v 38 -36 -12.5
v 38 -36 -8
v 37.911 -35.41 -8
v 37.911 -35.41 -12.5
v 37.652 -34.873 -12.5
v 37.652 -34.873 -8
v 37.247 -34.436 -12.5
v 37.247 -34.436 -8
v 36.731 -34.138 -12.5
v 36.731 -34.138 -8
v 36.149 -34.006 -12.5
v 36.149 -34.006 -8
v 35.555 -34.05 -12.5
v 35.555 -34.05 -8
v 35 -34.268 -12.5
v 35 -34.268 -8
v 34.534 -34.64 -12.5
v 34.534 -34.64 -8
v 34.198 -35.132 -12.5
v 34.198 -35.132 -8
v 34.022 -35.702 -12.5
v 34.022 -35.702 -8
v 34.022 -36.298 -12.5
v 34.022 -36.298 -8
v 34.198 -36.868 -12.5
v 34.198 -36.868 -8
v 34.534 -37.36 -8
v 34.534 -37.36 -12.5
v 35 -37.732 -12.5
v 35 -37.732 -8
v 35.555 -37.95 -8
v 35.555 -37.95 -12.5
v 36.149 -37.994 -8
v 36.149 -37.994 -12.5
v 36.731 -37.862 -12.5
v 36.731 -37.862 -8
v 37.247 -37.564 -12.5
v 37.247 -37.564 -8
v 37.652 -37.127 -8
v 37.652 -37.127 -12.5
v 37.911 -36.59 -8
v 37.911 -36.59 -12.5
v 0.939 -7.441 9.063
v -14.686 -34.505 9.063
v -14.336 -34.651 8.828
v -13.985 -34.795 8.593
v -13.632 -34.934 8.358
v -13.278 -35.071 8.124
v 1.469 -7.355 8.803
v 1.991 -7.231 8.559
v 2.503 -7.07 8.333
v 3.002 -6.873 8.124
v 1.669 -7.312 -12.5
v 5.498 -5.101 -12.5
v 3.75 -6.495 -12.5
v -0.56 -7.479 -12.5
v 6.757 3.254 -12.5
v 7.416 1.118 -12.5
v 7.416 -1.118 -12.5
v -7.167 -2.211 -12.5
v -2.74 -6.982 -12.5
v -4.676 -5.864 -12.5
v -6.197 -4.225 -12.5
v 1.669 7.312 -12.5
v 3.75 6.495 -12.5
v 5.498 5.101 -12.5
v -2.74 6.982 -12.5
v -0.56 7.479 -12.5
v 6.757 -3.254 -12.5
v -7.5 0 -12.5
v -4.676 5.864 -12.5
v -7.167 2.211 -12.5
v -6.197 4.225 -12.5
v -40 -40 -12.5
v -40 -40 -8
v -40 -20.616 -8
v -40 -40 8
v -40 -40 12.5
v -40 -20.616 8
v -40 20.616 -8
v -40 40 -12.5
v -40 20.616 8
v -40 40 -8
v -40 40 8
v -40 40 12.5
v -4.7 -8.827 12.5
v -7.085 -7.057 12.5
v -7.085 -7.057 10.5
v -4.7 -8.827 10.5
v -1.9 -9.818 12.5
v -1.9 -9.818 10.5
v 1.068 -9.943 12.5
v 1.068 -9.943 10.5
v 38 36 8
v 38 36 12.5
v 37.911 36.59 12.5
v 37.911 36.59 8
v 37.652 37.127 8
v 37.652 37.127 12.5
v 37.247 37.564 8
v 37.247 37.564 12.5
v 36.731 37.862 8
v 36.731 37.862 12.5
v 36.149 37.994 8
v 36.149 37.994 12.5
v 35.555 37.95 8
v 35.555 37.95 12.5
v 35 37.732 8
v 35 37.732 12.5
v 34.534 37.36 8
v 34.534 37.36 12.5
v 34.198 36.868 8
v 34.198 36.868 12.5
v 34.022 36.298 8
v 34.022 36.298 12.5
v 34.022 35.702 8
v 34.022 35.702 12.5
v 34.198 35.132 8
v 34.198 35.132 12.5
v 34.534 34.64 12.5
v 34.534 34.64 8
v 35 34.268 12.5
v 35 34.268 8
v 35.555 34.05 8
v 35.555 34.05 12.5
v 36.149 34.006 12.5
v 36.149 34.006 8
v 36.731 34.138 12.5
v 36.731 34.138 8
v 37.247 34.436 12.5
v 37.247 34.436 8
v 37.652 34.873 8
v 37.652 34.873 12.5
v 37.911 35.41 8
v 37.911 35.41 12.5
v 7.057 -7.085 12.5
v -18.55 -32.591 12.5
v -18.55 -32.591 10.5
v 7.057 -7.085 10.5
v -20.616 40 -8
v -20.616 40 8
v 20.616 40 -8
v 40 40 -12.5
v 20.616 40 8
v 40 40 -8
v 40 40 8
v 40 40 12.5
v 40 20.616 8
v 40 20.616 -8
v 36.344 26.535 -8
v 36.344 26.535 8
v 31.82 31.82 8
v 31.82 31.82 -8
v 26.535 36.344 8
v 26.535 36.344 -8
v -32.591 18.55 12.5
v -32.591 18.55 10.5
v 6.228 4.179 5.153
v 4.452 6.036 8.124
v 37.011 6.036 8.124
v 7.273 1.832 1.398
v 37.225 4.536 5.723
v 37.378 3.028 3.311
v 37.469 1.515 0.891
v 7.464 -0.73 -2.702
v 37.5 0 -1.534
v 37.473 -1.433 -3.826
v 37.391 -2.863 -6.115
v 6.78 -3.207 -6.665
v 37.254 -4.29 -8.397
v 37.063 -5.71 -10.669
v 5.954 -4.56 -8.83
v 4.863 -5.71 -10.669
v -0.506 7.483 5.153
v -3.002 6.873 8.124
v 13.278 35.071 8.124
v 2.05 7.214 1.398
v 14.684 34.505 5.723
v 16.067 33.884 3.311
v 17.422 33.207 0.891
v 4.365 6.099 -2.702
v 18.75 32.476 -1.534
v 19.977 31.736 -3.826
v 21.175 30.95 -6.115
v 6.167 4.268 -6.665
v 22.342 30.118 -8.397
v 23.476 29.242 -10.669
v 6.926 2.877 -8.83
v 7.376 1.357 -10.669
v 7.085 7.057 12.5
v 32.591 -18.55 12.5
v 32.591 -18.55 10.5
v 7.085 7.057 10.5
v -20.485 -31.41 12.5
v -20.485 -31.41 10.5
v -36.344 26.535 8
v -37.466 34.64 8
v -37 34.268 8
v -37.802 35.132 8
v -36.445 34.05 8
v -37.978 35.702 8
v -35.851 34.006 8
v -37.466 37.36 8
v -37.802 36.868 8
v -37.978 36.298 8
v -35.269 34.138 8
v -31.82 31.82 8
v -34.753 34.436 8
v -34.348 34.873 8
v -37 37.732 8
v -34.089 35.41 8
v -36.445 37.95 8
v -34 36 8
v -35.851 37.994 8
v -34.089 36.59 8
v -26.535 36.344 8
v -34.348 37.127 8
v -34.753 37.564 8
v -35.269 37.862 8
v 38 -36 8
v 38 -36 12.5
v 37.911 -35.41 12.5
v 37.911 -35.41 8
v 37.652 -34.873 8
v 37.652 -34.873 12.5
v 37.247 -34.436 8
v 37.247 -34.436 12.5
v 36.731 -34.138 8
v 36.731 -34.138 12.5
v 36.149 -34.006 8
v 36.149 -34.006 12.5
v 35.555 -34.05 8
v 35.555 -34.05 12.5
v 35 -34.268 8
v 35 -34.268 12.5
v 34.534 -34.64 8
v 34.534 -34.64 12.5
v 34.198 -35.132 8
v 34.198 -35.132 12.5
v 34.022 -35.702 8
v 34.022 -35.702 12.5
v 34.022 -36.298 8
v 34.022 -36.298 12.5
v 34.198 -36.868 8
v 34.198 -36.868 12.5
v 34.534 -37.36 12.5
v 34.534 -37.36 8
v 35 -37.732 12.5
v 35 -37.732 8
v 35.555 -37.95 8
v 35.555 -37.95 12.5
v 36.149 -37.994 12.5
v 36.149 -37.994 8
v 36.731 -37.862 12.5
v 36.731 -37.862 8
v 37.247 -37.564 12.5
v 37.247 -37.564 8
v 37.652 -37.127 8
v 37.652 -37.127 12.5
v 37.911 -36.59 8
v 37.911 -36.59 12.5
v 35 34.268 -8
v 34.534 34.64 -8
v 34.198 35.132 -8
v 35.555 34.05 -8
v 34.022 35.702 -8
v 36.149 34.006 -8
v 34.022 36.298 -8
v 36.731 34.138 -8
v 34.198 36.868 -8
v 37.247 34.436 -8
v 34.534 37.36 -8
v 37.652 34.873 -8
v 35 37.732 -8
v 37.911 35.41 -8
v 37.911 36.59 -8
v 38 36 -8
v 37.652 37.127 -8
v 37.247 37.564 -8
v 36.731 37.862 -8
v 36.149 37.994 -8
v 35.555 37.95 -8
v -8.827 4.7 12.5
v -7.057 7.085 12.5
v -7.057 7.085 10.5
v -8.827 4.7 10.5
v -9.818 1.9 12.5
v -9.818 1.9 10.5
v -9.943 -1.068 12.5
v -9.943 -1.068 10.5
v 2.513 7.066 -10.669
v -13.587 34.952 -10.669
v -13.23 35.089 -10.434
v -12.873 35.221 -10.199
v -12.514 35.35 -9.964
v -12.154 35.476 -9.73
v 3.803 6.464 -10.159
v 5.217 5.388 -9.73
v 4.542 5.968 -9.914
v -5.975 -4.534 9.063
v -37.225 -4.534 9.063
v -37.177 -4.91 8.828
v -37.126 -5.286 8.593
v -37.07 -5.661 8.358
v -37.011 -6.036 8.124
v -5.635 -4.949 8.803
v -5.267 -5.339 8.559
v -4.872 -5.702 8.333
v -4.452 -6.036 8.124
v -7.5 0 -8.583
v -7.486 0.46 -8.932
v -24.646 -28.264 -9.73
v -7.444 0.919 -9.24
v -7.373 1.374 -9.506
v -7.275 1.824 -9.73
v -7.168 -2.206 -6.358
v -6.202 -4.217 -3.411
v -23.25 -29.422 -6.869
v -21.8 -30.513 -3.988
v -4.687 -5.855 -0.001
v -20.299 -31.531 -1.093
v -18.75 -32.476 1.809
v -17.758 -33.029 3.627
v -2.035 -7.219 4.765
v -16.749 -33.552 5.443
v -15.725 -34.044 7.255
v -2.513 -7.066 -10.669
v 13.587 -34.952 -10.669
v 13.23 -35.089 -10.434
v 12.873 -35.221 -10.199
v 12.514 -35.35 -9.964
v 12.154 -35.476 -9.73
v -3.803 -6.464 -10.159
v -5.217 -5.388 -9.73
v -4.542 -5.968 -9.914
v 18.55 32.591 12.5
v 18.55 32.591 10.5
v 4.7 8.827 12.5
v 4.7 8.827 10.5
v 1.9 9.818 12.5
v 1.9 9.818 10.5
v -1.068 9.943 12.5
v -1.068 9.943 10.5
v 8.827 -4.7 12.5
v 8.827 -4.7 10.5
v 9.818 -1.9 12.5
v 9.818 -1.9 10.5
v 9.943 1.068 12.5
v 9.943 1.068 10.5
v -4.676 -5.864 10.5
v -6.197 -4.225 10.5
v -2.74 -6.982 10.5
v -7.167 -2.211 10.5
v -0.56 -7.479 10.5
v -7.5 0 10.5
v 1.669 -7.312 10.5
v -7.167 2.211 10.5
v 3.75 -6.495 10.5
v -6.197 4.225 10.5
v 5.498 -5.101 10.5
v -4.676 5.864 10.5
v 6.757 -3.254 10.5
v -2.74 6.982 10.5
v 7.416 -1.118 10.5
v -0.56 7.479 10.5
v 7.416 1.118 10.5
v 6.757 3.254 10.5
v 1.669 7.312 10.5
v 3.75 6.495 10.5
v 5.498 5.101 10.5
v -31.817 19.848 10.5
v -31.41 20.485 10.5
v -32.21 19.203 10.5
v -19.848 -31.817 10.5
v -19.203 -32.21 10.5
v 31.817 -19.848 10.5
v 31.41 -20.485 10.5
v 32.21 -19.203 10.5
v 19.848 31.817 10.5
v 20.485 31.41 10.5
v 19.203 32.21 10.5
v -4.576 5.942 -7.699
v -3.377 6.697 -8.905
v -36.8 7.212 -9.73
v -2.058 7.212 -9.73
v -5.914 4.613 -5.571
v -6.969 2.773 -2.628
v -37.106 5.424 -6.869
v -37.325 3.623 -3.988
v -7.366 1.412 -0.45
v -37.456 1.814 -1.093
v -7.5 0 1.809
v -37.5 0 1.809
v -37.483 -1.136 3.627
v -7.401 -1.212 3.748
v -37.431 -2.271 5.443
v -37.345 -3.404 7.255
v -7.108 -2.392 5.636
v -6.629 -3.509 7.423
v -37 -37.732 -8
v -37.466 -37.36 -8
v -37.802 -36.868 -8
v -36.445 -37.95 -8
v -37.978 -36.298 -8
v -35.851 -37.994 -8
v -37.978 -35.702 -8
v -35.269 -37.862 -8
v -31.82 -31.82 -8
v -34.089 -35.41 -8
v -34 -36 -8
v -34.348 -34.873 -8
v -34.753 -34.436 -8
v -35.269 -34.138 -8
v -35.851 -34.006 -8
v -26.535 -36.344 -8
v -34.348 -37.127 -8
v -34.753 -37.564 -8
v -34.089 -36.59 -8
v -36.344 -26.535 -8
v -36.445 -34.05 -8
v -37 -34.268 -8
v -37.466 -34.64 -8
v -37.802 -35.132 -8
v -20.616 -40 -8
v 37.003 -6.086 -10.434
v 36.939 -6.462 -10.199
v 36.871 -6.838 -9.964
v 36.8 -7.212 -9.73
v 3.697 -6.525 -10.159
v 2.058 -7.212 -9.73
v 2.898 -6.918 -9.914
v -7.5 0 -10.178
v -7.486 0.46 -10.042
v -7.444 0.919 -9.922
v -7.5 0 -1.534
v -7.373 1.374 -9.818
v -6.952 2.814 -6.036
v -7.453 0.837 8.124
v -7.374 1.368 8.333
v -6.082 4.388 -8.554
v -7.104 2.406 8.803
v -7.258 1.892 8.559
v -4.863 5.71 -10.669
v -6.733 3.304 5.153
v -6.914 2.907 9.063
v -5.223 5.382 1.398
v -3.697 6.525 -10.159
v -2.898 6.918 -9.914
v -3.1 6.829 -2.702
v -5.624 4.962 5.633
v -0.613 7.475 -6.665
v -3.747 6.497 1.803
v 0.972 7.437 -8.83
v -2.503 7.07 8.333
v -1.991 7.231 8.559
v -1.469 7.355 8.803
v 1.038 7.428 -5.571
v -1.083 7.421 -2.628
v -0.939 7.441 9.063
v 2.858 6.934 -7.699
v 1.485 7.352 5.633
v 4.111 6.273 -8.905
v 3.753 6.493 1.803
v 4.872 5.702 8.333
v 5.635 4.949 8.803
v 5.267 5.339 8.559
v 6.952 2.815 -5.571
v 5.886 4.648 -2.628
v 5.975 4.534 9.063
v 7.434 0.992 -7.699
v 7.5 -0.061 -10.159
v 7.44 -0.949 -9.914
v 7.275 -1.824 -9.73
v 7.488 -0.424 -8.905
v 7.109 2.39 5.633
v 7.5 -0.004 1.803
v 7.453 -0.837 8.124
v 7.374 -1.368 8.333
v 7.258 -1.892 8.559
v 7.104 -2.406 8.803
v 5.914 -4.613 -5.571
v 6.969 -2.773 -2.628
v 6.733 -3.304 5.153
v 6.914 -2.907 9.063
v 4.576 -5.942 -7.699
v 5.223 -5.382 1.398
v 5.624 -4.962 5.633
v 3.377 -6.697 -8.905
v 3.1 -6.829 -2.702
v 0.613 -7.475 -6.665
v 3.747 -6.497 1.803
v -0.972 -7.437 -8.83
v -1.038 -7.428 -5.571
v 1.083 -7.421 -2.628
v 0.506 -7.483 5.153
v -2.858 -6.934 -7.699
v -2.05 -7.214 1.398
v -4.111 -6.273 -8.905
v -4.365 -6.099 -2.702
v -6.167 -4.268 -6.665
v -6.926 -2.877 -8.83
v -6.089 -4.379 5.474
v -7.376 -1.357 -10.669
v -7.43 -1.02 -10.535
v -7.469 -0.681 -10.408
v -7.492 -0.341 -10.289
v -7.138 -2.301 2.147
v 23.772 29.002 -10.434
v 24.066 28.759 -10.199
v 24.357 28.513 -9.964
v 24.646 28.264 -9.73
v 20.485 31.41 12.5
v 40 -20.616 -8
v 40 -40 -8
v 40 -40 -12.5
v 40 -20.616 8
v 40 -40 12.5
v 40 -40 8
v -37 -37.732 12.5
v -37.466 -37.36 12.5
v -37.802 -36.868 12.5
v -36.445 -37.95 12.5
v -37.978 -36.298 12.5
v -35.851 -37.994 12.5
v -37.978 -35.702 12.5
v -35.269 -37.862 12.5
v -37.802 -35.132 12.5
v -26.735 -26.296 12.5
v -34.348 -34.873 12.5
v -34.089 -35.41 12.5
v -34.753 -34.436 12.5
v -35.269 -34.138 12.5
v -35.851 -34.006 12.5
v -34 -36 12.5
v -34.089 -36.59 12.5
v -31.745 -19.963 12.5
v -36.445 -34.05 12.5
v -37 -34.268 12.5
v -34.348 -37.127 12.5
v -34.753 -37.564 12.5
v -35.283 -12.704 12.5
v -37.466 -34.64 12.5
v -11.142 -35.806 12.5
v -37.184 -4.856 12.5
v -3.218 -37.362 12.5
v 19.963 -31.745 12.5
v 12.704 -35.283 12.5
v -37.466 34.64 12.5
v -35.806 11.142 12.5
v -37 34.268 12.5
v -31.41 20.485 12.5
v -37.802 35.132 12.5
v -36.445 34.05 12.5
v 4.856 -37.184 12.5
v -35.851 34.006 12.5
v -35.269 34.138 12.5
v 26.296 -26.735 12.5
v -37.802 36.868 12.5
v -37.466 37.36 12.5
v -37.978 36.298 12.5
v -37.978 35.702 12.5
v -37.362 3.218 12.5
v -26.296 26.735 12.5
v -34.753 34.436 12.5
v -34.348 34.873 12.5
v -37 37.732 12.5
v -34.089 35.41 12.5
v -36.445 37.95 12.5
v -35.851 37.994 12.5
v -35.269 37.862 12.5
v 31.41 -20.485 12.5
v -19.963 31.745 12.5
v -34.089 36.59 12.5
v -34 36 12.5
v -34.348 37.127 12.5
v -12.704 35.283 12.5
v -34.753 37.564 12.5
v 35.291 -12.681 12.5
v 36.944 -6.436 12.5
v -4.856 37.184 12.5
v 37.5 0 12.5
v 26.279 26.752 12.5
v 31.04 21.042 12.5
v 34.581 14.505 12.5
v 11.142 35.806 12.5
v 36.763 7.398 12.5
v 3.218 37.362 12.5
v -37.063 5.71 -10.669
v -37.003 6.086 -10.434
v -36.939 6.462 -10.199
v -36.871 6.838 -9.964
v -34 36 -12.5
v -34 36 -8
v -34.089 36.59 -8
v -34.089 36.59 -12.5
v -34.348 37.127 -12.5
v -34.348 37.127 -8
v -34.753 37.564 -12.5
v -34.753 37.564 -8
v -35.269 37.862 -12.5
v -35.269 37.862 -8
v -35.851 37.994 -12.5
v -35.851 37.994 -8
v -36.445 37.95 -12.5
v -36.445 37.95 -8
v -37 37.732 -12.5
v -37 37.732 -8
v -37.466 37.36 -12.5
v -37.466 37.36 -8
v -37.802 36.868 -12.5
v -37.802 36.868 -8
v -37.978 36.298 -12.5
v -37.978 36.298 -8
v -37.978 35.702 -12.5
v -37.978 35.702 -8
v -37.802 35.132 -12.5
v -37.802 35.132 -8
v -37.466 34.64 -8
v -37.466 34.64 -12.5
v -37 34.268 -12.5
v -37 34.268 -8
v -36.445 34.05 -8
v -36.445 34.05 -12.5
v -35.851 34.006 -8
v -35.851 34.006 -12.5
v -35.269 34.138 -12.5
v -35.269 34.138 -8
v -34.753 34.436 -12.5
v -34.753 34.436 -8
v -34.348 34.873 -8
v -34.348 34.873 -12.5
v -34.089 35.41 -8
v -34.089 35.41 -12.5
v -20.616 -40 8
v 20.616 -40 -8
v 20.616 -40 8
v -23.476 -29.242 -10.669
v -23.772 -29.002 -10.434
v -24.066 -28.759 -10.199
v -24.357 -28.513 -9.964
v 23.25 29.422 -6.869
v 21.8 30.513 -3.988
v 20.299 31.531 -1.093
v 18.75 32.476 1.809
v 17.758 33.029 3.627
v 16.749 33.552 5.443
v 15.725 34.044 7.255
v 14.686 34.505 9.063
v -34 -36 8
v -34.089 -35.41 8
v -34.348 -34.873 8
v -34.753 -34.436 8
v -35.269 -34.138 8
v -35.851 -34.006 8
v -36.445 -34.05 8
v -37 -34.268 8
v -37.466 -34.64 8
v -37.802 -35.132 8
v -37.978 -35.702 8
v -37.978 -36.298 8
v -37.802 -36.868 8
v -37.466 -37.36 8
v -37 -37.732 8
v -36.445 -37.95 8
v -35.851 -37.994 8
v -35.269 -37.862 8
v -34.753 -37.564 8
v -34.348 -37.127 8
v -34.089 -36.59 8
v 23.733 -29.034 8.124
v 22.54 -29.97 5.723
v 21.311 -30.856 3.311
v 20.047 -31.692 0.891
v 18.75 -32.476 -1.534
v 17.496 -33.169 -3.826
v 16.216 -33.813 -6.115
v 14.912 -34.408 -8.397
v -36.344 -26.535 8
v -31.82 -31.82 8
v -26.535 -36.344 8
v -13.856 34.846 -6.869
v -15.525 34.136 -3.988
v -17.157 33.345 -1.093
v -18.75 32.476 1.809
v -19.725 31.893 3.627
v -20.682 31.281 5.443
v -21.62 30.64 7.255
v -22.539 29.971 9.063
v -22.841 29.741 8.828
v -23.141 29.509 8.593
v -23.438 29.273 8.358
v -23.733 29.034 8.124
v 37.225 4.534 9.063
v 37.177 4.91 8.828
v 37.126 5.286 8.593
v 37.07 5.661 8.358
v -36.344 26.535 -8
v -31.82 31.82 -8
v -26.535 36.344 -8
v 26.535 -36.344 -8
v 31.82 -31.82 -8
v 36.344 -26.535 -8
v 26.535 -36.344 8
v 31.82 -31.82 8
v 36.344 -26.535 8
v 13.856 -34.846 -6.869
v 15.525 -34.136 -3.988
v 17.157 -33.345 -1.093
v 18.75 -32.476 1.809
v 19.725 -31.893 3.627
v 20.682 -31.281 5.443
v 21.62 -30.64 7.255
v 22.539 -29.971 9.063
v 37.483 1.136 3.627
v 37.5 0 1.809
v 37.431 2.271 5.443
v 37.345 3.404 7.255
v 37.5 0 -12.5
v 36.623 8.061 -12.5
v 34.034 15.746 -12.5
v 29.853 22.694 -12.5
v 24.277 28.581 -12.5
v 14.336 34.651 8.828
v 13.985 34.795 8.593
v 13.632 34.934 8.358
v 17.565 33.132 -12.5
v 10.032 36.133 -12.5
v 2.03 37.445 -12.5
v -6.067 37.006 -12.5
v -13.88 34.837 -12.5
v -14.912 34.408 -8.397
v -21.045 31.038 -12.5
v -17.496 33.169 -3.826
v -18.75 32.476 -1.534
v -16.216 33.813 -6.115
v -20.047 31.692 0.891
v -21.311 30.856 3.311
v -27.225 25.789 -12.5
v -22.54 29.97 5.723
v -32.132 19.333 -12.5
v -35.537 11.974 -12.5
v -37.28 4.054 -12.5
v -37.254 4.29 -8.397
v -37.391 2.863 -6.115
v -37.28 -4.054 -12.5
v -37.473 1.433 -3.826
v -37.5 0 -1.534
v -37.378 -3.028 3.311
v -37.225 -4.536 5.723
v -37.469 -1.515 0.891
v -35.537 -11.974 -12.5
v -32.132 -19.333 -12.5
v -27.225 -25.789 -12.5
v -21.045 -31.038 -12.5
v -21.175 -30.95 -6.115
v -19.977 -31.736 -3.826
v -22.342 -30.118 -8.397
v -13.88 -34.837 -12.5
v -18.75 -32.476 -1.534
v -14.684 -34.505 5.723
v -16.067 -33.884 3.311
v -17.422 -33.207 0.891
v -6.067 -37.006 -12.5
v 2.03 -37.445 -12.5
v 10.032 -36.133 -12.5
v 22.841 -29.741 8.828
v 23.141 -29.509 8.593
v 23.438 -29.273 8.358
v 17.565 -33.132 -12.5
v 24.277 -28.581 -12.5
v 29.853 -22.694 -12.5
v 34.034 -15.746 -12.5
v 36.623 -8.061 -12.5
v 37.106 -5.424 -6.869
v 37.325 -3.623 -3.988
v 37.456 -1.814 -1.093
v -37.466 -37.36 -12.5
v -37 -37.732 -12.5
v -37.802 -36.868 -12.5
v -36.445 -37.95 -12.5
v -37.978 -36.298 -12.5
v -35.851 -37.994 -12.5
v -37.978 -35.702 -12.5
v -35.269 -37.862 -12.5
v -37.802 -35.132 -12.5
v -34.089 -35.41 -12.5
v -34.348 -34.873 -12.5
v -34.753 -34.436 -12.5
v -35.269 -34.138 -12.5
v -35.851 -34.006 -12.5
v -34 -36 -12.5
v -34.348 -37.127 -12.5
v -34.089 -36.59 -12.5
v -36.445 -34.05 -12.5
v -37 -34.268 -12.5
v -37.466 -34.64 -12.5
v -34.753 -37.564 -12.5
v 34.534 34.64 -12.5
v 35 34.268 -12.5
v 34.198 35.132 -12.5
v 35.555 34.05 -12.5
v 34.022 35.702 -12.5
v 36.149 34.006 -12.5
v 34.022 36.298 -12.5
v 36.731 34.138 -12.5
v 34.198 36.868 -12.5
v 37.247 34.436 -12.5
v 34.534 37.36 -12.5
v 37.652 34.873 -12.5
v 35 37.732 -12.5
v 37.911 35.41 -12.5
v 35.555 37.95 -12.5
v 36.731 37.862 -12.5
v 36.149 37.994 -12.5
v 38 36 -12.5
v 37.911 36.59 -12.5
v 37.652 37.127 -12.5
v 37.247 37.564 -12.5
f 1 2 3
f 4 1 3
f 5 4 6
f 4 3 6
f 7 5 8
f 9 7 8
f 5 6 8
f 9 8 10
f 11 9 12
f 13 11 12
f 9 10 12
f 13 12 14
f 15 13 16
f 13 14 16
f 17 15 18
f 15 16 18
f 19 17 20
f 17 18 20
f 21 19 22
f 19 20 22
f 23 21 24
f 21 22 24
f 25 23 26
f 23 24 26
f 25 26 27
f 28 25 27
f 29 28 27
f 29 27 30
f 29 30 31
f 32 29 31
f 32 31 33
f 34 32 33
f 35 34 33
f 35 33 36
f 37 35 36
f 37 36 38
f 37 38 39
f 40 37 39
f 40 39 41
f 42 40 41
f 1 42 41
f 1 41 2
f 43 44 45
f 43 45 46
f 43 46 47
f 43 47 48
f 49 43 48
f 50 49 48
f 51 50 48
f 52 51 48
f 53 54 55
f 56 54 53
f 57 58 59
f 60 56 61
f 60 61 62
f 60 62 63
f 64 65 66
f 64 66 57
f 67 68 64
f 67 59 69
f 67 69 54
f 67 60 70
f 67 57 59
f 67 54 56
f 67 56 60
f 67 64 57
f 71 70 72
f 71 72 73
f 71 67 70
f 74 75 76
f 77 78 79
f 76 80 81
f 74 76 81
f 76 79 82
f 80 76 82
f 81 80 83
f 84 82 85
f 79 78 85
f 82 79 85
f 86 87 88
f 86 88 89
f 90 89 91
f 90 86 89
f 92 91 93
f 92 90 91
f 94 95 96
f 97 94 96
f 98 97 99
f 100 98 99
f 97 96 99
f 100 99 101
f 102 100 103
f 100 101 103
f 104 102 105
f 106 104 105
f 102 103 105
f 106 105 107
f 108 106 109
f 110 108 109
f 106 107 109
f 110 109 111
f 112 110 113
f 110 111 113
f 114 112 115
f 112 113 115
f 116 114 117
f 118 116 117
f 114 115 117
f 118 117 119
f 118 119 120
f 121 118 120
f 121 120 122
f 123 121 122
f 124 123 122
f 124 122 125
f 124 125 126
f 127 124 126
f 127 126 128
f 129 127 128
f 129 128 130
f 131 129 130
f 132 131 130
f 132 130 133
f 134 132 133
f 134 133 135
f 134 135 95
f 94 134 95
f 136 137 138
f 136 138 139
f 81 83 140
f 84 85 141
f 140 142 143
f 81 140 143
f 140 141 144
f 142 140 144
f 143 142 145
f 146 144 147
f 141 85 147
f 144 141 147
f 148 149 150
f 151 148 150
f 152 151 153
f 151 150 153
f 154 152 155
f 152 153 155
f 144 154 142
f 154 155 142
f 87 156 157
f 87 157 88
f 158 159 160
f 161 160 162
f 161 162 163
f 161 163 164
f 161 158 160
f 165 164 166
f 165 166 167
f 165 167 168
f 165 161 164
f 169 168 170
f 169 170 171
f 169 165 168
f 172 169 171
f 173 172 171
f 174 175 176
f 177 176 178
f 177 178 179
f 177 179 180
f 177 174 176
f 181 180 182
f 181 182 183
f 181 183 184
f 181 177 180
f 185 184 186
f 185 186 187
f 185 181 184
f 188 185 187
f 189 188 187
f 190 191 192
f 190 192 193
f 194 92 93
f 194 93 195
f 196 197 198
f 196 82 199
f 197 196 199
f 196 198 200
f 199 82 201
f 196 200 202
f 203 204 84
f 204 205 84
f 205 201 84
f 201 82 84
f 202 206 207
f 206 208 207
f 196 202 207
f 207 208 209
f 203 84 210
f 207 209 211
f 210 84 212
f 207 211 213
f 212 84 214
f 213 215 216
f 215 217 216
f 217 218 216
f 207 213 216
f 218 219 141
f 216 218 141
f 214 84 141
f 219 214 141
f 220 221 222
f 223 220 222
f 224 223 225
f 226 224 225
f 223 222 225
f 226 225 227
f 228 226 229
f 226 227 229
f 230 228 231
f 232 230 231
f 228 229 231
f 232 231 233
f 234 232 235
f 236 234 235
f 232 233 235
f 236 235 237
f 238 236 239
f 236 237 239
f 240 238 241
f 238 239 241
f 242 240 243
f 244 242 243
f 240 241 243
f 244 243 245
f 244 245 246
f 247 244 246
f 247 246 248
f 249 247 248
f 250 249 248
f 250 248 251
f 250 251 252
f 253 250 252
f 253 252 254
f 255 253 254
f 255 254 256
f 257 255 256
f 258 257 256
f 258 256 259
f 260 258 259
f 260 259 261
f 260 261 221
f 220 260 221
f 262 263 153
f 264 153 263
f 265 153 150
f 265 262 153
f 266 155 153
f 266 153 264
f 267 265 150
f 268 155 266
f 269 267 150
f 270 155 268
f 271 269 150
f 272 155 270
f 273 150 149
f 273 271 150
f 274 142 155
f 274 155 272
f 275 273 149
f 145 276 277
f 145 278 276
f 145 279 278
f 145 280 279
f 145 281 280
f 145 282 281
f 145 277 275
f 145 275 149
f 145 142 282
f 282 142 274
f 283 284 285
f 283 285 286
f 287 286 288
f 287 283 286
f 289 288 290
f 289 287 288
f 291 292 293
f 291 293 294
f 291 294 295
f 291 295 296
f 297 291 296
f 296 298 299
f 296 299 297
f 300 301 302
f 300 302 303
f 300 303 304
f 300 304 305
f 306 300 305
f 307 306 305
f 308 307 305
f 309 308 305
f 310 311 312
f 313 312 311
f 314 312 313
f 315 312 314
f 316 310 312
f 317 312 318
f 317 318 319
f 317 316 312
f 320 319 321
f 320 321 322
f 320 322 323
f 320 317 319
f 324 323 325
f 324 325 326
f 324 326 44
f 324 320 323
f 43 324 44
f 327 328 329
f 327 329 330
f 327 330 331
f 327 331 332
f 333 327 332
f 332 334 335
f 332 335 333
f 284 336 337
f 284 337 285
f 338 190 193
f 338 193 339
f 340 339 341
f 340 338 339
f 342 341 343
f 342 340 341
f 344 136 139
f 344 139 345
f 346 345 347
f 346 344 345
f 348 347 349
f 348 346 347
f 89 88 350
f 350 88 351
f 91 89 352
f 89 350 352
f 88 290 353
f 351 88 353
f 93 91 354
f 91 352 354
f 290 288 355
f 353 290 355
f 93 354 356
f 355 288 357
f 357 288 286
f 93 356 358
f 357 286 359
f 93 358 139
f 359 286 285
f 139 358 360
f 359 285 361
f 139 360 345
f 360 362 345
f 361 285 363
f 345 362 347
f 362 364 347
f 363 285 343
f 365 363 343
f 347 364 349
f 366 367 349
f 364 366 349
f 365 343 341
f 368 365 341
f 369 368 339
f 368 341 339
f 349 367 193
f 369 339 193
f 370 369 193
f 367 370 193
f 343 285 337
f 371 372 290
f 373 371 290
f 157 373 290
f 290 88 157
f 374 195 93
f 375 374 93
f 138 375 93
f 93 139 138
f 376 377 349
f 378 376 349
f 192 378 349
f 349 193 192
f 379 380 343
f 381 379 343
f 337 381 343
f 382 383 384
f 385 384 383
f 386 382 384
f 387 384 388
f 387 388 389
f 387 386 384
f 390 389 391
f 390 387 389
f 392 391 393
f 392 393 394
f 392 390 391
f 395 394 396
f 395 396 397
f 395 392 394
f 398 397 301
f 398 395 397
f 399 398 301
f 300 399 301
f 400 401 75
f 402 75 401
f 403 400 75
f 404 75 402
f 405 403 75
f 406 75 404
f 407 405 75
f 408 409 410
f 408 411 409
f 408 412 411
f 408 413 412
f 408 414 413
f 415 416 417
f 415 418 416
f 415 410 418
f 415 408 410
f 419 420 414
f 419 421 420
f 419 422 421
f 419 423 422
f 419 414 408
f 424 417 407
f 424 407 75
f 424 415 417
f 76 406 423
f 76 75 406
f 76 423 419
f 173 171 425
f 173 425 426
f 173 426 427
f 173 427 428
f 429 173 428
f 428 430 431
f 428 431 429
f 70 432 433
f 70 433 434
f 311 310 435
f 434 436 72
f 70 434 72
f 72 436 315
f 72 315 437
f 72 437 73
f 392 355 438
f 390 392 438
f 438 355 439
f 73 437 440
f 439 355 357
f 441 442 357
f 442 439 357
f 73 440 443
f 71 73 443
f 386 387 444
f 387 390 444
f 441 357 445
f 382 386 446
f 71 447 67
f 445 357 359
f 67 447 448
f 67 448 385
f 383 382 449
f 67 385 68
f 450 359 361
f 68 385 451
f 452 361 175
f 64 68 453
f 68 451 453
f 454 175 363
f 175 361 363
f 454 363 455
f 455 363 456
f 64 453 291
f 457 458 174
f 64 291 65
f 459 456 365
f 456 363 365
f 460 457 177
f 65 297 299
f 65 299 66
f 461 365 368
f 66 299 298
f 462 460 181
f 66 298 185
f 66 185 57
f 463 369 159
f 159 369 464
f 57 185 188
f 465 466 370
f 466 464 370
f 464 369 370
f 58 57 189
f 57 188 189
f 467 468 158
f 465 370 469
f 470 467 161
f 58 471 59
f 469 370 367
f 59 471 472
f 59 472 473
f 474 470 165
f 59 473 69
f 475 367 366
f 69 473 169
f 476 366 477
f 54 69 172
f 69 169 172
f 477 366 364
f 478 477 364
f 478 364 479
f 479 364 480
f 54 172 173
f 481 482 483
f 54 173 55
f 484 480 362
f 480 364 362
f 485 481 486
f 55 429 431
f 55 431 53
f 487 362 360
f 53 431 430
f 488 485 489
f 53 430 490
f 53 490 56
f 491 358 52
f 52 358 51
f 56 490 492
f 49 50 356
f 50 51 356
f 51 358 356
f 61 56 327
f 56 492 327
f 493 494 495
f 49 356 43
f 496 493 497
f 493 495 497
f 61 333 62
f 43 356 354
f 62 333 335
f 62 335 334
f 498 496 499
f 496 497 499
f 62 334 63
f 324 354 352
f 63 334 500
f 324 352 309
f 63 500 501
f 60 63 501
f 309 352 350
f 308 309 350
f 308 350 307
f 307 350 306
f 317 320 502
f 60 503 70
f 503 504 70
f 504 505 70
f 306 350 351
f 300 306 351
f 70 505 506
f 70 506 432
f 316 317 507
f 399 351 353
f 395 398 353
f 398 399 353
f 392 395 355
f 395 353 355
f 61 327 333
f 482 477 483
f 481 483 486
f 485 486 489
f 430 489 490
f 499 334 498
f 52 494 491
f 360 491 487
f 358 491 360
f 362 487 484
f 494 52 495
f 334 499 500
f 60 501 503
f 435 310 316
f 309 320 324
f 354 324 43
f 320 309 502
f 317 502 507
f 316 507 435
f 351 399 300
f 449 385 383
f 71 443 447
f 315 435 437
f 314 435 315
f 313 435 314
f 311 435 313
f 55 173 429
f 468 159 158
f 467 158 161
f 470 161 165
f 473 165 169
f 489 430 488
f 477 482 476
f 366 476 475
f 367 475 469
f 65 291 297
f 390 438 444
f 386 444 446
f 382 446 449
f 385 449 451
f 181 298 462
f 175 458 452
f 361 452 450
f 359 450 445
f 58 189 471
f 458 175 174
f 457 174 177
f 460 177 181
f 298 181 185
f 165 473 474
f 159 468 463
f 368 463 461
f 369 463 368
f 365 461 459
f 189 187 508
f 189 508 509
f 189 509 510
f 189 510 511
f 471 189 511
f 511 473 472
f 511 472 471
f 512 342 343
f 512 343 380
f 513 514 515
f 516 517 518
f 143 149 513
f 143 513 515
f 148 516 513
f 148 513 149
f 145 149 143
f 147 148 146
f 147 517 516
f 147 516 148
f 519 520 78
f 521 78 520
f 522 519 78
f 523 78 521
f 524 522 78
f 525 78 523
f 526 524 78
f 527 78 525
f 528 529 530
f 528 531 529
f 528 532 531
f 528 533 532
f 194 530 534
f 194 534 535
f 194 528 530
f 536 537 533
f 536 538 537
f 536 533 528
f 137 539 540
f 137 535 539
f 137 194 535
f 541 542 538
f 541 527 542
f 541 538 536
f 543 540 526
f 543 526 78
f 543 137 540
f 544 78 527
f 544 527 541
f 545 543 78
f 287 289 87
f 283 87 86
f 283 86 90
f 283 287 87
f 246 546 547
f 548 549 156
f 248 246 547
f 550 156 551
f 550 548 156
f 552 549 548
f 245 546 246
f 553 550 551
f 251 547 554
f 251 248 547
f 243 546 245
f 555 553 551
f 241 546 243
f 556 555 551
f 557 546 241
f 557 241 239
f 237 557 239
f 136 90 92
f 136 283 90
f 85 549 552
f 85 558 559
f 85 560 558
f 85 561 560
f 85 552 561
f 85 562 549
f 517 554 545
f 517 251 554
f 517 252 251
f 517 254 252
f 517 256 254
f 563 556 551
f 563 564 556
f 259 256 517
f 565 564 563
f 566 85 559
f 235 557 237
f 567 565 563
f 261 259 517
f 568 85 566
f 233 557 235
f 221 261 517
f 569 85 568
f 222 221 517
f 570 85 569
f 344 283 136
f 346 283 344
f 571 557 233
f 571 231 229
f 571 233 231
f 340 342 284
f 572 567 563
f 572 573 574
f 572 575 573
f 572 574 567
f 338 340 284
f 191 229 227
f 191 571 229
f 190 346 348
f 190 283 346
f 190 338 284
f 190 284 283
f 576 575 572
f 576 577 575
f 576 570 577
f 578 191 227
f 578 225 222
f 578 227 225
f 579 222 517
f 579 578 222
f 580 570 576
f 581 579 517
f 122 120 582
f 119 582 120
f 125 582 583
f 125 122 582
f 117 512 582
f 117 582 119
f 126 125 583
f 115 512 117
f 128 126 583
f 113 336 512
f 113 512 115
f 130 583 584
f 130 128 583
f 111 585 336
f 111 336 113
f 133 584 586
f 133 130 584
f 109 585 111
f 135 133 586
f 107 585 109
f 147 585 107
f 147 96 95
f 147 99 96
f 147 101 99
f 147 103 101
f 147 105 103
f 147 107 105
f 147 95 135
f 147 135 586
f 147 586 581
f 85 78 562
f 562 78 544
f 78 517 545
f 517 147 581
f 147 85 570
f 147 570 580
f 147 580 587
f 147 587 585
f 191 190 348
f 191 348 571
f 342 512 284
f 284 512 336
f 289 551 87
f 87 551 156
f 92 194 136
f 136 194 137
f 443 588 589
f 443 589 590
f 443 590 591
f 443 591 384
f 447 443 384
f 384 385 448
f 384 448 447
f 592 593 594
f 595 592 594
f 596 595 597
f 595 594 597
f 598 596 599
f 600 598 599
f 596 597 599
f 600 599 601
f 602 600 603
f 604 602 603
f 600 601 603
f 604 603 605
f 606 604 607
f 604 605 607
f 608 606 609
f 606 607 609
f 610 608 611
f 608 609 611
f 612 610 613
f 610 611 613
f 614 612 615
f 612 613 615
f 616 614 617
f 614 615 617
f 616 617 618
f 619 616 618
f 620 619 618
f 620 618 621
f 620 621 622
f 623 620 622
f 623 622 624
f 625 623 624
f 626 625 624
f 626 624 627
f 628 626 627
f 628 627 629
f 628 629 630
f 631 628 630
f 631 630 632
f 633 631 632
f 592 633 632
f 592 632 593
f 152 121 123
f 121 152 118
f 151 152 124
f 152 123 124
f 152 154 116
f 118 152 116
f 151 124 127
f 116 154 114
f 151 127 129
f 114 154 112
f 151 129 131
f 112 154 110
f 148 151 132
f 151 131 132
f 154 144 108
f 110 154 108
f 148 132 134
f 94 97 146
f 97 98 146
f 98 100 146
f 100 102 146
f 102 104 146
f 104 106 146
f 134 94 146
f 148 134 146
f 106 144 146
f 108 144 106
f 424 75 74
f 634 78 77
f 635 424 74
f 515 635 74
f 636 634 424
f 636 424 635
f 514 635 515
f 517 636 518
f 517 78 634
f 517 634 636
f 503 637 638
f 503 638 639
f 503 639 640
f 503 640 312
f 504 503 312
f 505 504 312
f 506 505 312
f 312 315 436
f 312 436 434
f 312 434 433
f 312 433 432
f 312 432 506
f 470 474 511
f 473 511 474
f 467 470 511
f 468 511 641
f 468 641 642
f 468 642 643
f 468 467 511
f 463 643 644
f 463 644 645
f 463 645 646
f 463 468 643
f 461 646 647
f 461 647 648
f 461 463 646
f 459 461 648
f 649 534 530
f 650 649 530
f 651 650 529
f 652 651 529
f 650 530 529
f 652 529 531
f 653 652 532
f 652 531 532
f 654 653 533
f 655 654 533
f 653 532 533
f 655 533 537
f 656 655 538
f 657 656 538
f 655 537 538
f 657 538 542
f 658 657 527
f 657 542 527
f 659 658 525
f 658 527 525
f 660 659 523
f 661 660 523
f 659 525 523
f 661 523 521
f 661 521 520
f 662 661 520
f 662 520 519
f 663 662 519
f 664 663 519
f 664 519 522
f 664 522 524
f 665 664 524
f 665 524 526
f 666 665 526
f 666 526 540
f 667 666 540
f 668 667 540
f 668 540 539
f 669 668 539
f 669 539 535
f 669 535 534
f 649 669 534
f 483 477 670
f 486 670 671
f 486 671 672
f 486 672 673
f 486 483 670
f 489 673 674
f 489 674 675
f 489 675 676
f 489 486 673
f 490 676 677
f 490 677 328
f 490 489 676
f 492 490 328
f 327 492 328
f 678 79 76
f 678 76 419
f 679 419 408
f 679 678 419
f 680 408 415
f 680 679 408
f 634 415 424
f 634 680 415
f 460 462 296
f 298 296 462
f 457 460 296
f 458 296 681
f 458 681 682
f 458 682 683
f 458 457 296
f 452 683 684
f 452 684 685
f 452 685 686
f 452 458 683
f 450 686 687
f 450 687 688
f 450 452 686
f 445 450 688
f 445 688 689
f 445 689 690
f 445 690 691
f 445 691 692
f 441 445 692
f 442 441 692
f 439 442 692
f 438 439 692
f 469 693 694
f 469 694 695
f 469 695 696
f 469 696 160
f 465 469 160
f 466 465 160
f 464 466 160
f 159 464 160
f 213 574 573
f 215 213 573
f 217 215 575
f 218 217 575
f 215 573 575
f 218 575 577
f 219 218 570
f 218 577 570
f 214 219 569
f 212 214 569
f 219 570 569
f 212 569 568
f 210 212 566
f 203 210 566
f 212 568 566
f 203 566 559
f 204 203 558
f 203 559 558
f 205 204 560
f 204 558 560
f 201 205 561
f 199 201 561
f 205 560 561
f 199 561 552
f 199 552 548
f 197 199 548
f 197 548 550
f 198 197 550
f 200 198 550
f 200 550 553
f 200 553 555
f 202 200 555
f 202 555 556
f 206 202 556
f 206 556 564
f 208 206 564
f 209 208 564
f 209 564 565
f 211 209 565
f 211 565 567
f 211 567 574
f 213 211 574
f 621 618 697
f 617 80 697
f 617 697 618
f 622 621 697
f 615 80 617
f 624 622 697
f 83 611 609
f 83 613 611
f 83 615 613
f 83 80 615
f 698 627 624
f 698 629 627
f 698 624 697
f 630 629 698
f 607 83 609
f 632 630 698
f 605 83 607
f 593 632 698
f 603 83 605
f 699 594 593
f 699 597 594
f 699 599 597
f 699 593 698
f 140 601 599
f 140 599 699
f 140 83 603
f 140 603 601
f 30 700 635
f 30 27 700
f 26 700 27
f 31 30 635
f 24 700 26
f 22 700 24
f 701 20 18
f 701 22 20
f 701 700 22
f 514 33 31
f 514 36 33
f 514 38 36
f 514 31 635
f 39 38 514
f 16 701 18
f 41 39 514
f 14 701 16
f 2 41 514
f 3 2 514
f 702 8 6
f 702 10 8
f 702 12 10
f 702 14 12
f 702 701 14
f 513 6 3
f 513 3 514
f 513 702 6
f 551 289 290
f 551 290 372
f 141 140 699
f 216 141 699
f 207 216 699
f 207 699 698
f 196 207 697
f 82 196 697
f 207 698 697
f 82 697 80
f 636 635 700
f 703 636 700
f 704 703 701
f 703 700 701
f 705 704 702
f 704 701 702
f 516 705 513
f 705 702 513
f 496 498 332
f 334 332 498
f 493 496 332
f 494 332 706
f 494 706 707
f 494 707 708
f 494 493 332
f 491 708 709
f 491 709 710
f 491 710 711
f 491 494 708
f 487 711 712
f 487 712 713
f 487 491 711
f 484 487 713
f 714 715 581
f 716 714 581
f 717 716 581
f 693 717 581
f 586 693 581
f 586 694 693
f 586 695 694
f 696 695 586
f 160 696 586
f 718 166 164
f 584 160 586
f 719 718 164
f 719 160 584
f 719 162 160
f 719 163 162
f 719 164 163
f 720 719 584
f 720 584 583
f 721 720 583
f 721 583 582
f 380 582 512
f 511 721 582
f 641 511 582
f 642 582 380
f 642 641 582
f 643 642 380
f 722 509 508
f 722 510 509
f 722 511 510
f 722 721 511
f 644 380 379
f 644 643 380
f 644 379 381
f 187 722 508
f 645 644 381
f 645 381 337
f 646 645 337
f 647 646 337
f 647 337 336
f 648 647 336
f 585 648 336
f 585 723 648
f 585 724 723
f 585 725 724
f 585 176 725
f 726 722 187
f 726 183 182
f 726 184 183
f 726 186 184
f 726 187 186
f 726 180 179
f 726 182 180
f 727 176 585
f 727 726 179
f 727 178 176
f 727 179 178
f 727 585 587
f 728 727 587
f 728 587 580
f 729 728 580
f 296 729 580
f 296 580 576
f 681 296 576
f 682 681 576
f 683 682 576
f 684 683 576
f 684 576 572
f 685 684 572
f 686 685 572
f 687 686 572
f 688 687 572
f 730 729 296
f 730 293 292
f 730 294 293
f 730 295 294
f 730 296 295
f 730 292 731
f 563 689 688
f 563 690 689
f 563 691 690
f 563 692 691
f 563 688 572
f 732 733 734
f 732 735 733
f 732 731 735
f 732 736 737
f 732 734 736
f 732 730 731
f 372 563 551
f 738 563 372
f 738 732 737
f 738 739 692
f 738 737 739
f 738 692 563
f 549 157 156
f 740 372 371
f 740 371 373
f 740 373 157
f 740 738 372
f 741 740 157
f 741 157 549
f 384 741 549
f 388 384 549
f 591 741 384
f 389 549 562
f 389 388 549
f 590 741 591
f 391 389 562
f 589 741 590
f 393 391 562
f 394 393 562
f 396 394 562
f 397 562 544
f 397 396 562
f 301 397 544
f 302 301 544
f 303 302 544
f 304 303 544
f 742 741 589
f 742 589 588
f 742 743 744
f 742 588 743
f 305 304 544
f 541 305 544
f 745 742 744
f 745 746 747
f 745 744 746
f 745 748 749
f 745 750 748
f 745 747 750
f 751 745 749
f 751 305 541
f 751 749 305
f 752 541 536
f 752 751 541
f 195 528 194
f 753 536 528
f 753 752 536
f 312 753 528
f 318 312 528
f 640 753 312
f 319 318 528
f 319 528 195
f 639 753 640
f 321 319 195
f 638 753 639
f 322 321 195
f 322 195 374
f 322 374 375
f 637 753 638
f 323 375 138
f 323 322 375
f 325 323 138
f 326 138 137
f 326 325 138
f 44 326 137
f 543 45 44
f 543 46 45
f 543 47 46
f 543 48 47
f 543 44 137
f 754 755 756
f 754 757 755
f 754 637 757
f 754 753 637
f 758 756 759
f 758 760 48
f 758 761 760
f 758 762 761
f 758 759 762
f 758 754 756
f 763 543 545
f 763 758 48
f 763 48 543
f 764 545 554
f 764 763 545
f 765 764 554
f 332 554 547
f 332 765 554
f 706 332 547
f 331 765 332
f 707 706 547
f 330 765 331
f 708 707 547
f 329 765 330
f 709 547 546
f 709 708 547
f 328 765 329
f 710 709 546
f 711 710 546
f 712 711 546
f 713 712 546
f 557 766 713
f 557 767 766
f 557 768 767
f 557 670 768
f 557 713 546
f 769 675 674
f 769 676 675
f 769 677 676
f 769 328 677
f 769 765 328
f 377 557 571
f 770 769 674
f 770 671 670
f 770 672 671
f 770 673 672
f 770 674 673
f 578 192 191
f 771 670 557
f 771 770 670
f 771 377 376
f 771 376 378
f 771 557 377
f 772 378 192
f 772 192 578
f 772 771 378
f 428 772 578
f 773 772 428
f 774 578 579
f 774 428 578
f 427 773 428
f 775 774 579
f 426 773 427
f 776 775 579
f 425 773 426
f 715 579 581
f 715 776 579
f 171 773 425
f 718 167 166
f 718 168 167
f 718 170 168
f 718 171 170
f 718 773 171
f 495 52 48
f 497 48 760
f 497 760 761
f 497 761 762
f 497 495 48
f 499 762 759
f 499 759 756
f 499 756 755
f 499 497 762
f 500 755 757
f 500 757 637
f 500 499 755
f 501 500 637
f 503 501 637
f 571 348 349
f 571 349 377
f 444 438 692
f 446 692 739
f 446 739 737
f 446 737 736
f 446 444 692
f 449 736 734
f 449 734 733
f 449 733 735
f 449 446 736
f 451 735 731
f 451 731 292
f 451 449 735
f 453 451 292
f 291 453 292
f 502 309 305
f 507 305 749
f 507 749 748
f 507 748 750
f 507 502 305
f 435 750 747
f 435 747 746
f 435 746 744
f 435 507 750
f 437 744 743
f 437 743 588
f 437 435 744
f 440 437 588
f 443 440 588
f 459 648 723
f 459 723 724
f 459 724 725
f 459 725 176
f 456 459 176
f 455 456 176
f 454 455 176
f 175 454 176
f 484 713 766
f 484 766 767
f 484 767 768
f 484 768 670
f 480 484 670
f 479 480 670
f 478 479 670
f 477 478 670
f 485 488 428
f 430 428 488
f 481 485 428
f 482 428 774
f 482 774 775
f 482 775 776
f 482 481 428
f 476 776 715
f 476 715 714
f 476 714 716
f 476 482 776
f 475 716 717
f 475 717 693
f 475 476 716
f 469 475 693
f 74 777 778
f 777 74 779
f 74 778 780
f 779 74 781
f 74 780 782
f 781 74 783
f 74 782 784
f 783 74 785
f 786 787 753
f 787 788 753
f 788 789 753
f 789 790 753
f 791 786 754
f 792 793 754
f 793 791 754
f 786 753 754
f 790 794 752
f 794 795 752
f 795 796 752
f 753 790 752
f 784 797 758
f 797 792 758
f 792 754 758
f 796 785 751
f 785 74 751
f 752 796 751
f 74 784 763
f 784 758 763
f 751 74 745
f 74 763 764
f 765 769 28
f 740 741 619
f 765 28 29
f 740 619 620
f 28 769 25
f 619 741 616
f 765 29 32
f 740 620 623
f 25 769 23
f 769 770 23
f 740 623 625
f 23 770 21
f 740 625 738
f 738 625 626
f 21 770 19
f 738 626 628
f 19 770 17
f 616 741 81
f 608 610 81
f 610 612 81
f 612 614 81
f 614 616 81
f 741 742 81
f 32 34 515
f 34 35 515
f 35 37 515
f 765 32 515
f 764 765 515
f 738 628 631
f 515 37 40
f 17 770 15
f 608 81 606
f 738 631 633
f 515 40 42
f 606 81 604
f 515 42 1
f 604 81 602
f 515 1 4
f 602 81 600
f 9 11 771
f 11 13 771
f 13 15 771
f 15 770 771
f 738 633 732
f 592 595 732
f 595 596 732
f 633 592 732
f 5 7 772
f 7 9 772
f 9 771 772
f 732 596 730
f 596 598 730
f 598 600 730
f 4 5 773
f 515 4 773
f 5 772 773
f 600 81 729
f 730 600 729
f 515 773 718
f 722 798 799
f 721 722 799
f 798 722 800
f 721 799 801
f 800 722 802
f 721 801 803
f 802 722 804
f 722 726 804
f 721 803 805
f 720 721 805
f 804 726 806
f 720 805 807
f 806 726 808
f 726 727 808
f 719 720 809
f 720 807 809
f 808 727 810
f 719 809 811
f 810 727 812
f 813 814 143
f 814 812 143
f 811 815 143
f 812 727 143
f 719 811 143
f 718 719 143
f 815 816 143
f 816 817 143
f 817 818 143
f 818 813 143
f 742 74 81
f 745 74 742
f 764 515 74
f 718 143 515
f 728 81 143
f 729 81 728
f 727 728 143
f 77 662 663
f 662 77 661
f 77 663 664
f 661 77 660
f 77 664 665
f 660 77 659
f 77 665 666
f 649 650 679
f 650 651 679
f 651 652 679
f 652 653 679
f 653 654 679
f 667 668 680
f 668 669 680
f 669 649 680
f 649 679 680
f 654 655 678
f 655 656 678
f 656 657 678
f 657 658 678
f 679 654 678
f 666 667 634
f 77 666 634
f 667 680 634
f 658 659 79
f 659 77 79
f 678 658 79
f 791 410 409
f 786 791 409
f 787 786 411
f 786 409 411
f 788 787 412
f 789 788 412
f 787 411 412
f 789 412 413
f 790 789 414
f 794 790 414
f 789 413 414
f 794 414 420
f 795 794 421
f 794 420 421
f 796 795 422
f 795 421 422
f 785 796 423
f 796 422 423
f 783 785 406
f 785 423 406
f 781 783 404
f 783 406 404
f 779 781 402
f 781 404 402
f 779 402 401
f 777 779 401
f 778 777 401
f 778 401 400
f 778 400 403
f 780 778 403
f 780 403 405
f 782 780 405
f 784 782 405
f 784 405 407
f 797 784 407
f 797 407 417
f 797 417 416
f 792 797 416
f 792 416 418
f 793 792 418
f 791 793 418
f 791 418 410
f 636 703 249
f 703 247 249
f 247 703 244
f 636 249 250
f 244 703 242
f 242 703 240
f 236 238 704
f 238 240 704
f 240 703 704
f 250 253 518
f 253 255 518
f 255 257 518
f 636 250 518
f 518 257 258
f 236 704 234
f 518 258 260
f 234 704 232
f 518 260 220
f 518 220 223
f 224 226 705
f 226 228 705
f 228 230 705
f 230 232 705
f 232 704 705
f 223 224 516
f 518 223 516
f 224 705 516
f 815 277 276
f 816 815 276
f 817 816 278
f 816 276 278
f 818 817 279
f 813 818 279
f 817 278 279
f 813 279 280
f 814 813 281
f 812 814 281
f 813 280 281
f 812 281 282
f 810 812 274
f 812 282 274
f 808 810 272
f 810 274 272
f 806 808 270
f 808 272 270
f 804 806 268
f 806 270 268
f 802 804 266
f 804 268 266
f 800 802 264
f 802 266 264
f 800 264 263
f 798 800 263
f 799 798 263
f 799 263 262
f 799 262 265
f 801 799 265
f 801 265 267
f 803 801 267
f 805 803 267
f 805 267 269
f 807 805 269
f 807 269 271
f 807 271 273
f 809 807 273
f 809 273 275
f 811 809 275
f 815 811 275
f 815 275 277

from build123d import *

# Parameters (mm, degrees)
SKETCH1_W                = 80
SKETCH1_H                = 80
SKETCH1_R                = 37.5
BOSS_EXTRUDE1_DEPTH      = 12.5
BOSS_EXTRUDE1_DEPTH_BACK = 12.5
SKETCH2_R                = 60
SKETCH2_R_2              = 45
CUT_EXTRUDE1_DEPTH       = 8
CUT_EXTRUDE1_DEPTH_BACK  = 8
SKETCH3_R                = 2
CUT_EXTRUDE2_DEPTH       = 26
SKETCH4_R                = 10
BOSS_EXTRUDE2_DEPTH      = 2
SKETCH5_R                = 7.5
BOSS_EXTRUDE3_DEPTH      = 23
BOSS_EXTRUDE9_START      = -17.942054
BOSS_EXTRUDE9_DEPTH      = 35.442054
CIRPATTERN1_COUNT        = 6


with BuildPart() as part:
    # Sketch1 → Boss-Extrude1 (new body, two sides)
    with BuildSketch(Plane.XY) as boss_extrude1_sk:
        Rectangle(SKETCH1_W, SKETCH1_H)
        Circle(SKETCH1_R, mode=Mode.SUBTRACT)
    extrude(amount=BOSS_EXTRUDE1_DEPTH)
    extrude(boss_extrude1_sk.sketch, amount=-BOSS_EXTRUDE1_DEPTH_BACK)

    # Sketch2 → Cut-Extrude1 (cut, two sides)
    with BuildSketch(Plane.XY) as cut_extrude1_sk:
        Circle(SKETCH2_R)
        Circle(SKETCH2_R_2, mode=Mode.SUBTRACT)
    extrude(amount=CUT_EXTRUDE1_DEPTH, mode=Mode.SUBTRACT)
    extrude(cut_extrude1_sk.sketch, amount=-CUT_EXTRUDE1_DEPTH_BACK, mode=Mode.SUBTRACT)

    # Sketch3 → Cut-Extrude2 (cut, through all)
    with BuildSketch(Plane.XY.offset(12.5)):
        with Locations((-36, 36)):
            Circle(SKETCH3_R)
        with Locations((36, 36)):
            Circle(SKETCH3_R)
        with Locations((36, -36)):
            Circle(SKETCH3_R)
        with Locations((-36, -36)):
            Circle(SKETCH3_R)
    extrude(amount=-CUT_EXTRUDE2_DEPTH, mode=Mode.SUBTRACT)

    # Sketch4 → Boss-Extrude2 (add)
    with BuildSketch(Plane.XY.offset(12.5)):
        with BuildLine():
            Line((18.549623759, 32.590818621), (-7.057093407, 7.085014654))
            ThreePointArc((-7.057093407, 7.085014654), (-4.306304625, 9.025283401), (-1.067547722, 9.942853809))
            Line((-1.067547722, 9.942853809), (20.484975285, 31.410440741))
            ThreePointArc((20.484975285, 31.410440741), (19.526220925, 32.015257244), (18.549623759, 32.590818621))
        make_face()
        Circle(SKETCH4_R)
        with BuildLine():
            ThreePointArc((-7.085014654, -7.057093407), (-9.025283401, -4.306304625), (-9.942853809, -1.067547722))
            Line((-9.942853809, -1.067547722), (-31.410440741, 20.484975285))
            ThreePointArc((-31.410440741, 20.484975285), (-32.015257244, 19.526220925), (-32.590818621, 18.549623759))
            Line((-32.590818621, 18.549623759), (-7.085014654, -7.057093407))
        make_face()
        with BuildLine():
            Line((32.590818621, -18.549623759), (7.085014654, 7.057093407))
            ThreePointArc((7.085014654, 7.057093407), (9.025283401, 4.306304625), (9.942853809, 1.067547722))
            Line((9.942853809, 1.067547722), (31.410440741, -20.484975285))
            ThreePointArc((31.410440741, -20.484975285), (32.015257244, -19.526220925), (32.590818621, -18.549623759))
        make_face()
        with BuildLine():
            ThreePointArc((7.057093407, -7.085014654), (4.306304625, -9.025283401), (1.067547722, -9.942853809))
            Line((1.067547722, -9.942853809), (-20.484975285, -31.410440741))
            ThreePointArc((-20.484975285, -31.410440741), (-19.526220925, -32.015257244), (-18.549623759, -32.590818621))
            Line((-18.549623759, -32.590818621), (7.057093407, -7.085014654))
        make_face()
    extrude(amount=-BOSS_EXTRUDE2_DEPTH)

    # Sketch5 → Boss-Extrude3 (add)
    with BuildSketch(Plane(origin=(0, 0, 10.5), x_dir=(-1, 0, 0), z_dir=(0, 0, -1))):
        Circle(SKETCH5_R)
    extrude(amount=BOSS_EXTRUDE3_DEPTH)

    # Sketch7 → Boss-Extrude9 (add)
    with BuildSketch(Plane(origin=(20, 0, 0), x_dir=(0, 0, -1), z_dir=(1, 0, 0)).offset(BOSS_EXTRUDE9_START)):
        Polygon((9.730274214, -7.212132837), (-9.063025071, 4.533679216), (-8.124052437, 6.03603543), (10.669246848, -5.709776623), align=None)
    boss_extrude9 = extrude(amount=BOSS_EXTRUDE9_DEPTH)

    # CirPattern1: Boss-Extrude9 ×6 about axis
    cirpattern1_axis = Axis((0, 0, 0), (0, 0, 1))
    for i in range(1, CIRPATTERN1_COUNT):
        add(boss_extrude9.rotate(cirpattern1_axis, i * 360 / CIRPATTERN1_COUNT))


solid = part.part
